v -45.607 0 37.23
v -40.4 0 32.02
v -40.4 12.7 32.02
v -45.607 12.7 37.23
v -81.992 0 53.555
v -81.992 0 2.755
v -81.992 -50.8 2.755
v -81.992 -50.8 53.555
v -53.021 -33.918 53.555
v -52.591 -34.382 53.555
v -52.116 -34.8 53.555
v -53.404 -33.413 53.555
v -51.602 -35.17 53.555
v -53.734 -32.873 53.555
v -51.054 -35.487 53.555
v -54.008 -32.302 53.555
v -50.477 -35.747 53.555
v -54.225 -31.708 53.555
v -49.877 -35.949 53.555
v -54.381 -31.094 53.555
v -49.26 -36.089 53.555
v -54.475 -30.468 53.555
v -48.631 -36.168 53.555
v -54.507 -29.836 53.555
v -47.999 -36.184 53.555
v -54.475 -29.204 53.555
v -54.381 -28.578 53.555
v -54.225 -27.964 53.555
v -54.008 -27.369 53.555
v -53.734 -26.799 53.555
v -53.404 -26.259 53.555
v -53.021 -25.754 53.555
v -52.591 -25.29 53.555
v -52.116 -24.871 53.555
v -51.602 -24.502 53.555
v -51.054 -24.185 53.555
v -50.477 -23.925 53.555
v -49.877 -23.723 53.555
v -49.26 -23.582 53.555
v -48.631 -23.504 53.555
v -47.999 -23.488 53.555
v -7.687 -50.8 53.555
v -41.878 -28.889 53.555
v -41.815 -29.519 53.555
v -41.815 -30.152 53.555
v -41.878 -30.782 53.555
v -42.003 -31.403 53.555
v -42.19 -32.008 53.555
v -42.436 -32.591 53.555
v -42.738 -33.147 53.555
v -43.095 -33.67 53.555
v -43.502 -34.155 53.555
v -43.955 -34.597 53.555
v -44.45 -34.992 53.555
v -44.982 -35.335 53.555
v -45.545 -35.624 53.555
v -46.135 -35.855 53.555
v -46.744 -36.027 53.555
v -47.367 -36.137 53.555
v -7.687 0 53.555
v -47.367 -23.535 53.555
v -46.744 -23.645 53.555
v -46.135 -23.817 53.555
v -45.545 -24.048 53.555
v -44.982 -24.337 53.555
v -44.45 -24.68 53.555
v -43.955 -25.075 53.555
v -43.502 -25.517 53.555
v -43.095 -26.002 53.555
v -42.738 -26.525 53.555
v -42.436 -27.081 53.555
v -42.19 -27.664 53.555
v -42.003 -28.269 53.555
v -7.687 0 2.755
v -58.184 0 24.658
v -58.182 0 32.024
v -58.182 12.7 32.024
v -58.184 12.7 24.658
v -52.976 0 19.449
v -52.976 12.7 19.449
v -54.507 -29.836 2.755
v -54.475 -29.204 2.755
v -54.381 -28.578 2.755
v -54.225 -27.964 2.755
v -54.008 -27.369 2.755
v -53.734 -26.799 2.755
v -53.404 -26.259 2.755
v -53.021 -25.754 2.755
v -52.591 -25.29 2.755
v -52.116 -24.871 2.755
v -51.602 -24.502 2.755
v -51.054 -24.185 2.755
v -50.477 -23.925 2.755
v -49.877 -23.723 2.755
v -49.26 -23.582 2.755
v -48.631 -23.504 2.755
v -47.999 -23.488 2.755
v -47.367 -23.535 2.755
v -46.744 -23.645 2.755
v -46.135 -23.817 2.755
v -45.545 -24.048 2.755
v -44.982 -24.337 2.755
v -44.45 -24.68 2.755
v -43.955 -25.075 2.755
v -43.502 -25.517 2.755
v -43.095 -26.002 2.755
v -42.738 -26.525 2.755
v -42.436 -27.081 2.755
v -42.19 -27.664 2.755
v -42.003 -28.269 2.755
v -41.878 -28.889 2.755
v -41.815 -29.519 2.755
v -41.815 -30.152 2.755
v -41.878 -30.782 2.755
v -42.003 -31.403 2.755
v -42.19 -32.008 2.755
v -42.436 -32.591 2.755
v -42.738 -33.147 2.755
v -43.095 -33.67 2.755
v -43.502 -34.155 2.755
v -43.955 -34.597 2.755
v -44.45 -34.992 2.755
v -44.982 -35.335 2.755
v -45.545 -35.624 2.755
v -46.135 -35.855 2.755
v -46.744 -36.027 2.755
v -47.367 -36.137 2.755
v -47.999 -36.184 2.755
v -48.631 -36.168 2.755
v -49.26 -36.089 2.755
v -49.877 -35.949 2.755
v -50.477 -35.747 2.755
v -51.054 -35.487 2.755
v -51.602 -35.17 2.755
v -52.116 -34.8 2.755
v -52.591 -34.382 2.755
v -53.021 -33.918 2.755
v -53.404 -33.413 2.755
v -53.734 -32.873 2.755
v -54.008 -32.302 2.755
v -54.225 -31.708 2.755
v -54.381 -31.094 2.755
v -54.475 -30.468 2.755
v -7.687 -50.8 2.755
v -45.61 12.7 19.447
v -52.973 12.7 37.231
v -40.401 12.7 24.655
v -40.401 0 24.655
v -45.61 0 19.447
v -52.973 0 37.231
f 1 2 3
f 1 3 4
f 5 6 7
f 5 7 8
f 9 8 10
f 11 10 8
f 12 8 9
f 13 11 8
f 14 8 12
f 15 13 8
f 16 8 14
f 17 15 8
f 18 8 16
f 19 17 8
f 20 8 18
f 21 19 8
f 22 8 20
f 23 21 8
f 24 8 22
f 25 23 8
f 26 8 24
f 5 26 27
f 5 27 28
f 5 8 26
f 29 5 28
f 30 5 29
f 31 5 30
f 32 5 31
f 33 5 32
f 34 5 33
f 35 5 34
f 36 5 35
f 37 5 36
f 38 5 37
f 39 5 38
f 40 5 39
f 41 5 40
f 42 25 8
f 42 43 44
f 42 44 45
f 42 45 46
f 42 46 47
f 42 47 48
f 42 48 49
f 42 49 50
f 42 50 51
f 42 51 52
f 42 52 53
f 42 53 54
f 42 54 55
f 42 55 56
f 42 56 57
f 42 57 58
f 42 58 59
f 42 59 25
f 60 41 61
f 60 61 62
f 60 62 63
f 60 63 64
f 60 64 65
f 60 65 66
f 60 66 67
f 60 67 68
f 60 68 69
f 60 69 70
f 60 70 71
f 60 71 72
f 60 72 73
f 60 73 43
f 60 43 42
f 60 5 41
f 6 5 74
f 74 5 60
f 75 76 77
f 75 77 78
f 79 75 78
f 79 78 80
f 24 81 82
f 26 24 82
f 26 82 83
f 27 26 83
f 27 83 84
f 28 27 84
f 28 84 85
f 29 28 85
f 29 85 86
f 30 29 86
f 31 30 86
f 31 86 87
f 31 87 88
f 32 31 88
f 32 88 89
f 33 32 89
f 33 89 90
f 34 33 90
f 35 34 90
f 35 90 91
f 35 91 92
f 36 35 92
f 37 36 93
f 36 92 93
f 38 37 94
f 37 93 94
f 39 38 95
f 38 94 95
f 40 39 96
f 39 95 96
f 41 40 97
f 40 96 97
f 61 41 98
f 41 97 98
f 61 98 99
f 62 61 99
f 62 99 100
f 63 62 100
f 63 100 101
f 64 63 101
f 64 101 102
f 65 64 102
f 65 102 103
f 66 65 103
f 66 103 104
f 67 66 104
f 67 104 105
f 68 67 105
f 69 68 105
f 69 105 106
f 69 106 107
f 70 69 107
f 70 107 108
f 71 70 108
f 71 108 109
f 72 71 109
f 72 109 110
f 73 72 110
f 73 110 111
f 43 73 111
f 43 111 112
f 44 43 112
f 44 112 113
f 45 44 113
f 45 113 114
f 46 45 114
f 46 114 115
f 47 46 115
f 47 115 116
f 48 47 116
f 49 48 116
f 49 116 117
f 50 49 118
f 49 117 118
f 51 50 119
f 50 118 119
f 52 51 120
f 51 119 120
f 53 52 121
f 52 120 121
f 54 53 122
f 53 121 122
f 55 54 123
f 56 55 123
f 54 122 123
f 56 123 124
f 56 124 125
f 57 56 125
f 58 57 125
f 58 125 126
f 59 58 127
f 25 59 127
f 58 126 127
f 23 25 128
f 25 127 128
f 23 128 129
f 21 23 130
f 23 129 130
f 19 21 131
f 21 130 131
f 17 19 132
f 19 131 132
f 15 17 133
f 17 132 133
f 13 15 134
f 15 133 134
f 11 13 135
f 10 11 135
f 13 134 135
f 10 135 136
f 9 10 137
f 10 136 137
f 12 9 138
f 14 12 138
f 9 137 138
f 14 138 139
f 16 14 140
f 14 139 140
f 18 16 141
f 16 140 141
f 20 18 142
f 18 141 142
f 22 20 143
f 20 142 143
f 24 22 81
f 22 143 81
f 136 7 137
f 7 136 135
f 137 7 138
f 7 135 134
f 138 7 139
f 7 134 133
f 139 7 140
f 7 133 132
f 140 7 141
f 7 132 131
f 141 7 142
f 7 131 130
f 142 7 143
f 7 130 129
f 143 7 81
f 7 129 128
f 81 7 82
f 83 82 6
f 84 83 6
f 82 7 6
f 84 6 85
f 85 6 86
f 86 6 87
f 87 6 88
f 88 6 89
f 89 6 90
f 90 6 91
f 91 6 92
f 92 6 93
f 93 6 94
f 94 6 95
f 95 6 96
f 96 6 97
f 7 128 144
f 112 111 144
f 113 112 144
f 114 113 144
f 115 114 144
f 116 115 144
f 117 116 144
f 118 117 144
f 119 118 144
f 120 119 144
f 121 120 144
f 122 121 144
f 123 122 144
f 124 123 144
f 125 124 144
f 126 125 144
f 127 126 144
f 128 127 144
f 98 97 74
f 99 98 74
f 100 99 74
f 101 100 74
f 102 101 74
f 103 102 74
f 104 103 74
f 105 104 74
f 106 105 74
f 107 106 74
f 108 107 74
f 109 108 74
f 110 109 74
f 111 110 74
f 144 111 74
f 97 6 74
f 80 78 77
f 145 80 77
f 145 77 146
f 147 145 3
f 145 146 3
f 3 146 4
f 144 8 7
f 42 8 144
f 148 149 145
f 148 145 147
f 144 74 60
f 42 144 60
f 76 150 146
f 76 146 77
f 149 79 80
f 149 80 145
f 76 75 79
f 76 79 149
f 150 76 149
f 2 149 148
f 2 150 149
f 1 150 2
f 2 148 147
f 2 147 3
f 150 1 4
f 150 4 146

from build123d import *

# Parameters (mm, degrees)
F0_W     = 74.3044822258
F0_H     = 50.8
F1_DEPTH = 50.8
F5_D     = 12.7
F7_DEPTH = 12.7


# Not quite as in the source:
# - the program builds the solid bodies; features that only make, move or delete a surface that nothing else refers to are left out


with BuildPart() as f1:
    # F0 (on Front) → F1 (new body)
    with BuildSketch(Plane.XZ):
        with Locations((-44.8397286236, 28.155177366)):
            Rectangle(F0_W, F0_H)
    extrude(amount=F1_DEPTH)

    # F5 (through all)
    with Locations(Plane.XY.offset(53.555177366)):
        with Locations((-48.1568910182, -29.835857451)):
            Hole(F5_D / 2)


with BuildPart() as f7:
    # F6 (on face) → F7 (new body)
    with BuildSketch(Plane.XZ):
        Polygon((-40.3997157671, 32.0204286902), (-45.6071044348, 37.2297600777), (-52.9728378235, 37.231133788), (-58.182169211, 32.0237451204), (-58.1835429214, 24.6580117316), (-52.9761542537, 19.4486803441), (-45.6104208649, 19.4473066338), (-40.4010894774, 24.6546953015), align=None)
    extrude(amount=-F7_DEPTH)


solid = Compound([f1.part, f7.part])
